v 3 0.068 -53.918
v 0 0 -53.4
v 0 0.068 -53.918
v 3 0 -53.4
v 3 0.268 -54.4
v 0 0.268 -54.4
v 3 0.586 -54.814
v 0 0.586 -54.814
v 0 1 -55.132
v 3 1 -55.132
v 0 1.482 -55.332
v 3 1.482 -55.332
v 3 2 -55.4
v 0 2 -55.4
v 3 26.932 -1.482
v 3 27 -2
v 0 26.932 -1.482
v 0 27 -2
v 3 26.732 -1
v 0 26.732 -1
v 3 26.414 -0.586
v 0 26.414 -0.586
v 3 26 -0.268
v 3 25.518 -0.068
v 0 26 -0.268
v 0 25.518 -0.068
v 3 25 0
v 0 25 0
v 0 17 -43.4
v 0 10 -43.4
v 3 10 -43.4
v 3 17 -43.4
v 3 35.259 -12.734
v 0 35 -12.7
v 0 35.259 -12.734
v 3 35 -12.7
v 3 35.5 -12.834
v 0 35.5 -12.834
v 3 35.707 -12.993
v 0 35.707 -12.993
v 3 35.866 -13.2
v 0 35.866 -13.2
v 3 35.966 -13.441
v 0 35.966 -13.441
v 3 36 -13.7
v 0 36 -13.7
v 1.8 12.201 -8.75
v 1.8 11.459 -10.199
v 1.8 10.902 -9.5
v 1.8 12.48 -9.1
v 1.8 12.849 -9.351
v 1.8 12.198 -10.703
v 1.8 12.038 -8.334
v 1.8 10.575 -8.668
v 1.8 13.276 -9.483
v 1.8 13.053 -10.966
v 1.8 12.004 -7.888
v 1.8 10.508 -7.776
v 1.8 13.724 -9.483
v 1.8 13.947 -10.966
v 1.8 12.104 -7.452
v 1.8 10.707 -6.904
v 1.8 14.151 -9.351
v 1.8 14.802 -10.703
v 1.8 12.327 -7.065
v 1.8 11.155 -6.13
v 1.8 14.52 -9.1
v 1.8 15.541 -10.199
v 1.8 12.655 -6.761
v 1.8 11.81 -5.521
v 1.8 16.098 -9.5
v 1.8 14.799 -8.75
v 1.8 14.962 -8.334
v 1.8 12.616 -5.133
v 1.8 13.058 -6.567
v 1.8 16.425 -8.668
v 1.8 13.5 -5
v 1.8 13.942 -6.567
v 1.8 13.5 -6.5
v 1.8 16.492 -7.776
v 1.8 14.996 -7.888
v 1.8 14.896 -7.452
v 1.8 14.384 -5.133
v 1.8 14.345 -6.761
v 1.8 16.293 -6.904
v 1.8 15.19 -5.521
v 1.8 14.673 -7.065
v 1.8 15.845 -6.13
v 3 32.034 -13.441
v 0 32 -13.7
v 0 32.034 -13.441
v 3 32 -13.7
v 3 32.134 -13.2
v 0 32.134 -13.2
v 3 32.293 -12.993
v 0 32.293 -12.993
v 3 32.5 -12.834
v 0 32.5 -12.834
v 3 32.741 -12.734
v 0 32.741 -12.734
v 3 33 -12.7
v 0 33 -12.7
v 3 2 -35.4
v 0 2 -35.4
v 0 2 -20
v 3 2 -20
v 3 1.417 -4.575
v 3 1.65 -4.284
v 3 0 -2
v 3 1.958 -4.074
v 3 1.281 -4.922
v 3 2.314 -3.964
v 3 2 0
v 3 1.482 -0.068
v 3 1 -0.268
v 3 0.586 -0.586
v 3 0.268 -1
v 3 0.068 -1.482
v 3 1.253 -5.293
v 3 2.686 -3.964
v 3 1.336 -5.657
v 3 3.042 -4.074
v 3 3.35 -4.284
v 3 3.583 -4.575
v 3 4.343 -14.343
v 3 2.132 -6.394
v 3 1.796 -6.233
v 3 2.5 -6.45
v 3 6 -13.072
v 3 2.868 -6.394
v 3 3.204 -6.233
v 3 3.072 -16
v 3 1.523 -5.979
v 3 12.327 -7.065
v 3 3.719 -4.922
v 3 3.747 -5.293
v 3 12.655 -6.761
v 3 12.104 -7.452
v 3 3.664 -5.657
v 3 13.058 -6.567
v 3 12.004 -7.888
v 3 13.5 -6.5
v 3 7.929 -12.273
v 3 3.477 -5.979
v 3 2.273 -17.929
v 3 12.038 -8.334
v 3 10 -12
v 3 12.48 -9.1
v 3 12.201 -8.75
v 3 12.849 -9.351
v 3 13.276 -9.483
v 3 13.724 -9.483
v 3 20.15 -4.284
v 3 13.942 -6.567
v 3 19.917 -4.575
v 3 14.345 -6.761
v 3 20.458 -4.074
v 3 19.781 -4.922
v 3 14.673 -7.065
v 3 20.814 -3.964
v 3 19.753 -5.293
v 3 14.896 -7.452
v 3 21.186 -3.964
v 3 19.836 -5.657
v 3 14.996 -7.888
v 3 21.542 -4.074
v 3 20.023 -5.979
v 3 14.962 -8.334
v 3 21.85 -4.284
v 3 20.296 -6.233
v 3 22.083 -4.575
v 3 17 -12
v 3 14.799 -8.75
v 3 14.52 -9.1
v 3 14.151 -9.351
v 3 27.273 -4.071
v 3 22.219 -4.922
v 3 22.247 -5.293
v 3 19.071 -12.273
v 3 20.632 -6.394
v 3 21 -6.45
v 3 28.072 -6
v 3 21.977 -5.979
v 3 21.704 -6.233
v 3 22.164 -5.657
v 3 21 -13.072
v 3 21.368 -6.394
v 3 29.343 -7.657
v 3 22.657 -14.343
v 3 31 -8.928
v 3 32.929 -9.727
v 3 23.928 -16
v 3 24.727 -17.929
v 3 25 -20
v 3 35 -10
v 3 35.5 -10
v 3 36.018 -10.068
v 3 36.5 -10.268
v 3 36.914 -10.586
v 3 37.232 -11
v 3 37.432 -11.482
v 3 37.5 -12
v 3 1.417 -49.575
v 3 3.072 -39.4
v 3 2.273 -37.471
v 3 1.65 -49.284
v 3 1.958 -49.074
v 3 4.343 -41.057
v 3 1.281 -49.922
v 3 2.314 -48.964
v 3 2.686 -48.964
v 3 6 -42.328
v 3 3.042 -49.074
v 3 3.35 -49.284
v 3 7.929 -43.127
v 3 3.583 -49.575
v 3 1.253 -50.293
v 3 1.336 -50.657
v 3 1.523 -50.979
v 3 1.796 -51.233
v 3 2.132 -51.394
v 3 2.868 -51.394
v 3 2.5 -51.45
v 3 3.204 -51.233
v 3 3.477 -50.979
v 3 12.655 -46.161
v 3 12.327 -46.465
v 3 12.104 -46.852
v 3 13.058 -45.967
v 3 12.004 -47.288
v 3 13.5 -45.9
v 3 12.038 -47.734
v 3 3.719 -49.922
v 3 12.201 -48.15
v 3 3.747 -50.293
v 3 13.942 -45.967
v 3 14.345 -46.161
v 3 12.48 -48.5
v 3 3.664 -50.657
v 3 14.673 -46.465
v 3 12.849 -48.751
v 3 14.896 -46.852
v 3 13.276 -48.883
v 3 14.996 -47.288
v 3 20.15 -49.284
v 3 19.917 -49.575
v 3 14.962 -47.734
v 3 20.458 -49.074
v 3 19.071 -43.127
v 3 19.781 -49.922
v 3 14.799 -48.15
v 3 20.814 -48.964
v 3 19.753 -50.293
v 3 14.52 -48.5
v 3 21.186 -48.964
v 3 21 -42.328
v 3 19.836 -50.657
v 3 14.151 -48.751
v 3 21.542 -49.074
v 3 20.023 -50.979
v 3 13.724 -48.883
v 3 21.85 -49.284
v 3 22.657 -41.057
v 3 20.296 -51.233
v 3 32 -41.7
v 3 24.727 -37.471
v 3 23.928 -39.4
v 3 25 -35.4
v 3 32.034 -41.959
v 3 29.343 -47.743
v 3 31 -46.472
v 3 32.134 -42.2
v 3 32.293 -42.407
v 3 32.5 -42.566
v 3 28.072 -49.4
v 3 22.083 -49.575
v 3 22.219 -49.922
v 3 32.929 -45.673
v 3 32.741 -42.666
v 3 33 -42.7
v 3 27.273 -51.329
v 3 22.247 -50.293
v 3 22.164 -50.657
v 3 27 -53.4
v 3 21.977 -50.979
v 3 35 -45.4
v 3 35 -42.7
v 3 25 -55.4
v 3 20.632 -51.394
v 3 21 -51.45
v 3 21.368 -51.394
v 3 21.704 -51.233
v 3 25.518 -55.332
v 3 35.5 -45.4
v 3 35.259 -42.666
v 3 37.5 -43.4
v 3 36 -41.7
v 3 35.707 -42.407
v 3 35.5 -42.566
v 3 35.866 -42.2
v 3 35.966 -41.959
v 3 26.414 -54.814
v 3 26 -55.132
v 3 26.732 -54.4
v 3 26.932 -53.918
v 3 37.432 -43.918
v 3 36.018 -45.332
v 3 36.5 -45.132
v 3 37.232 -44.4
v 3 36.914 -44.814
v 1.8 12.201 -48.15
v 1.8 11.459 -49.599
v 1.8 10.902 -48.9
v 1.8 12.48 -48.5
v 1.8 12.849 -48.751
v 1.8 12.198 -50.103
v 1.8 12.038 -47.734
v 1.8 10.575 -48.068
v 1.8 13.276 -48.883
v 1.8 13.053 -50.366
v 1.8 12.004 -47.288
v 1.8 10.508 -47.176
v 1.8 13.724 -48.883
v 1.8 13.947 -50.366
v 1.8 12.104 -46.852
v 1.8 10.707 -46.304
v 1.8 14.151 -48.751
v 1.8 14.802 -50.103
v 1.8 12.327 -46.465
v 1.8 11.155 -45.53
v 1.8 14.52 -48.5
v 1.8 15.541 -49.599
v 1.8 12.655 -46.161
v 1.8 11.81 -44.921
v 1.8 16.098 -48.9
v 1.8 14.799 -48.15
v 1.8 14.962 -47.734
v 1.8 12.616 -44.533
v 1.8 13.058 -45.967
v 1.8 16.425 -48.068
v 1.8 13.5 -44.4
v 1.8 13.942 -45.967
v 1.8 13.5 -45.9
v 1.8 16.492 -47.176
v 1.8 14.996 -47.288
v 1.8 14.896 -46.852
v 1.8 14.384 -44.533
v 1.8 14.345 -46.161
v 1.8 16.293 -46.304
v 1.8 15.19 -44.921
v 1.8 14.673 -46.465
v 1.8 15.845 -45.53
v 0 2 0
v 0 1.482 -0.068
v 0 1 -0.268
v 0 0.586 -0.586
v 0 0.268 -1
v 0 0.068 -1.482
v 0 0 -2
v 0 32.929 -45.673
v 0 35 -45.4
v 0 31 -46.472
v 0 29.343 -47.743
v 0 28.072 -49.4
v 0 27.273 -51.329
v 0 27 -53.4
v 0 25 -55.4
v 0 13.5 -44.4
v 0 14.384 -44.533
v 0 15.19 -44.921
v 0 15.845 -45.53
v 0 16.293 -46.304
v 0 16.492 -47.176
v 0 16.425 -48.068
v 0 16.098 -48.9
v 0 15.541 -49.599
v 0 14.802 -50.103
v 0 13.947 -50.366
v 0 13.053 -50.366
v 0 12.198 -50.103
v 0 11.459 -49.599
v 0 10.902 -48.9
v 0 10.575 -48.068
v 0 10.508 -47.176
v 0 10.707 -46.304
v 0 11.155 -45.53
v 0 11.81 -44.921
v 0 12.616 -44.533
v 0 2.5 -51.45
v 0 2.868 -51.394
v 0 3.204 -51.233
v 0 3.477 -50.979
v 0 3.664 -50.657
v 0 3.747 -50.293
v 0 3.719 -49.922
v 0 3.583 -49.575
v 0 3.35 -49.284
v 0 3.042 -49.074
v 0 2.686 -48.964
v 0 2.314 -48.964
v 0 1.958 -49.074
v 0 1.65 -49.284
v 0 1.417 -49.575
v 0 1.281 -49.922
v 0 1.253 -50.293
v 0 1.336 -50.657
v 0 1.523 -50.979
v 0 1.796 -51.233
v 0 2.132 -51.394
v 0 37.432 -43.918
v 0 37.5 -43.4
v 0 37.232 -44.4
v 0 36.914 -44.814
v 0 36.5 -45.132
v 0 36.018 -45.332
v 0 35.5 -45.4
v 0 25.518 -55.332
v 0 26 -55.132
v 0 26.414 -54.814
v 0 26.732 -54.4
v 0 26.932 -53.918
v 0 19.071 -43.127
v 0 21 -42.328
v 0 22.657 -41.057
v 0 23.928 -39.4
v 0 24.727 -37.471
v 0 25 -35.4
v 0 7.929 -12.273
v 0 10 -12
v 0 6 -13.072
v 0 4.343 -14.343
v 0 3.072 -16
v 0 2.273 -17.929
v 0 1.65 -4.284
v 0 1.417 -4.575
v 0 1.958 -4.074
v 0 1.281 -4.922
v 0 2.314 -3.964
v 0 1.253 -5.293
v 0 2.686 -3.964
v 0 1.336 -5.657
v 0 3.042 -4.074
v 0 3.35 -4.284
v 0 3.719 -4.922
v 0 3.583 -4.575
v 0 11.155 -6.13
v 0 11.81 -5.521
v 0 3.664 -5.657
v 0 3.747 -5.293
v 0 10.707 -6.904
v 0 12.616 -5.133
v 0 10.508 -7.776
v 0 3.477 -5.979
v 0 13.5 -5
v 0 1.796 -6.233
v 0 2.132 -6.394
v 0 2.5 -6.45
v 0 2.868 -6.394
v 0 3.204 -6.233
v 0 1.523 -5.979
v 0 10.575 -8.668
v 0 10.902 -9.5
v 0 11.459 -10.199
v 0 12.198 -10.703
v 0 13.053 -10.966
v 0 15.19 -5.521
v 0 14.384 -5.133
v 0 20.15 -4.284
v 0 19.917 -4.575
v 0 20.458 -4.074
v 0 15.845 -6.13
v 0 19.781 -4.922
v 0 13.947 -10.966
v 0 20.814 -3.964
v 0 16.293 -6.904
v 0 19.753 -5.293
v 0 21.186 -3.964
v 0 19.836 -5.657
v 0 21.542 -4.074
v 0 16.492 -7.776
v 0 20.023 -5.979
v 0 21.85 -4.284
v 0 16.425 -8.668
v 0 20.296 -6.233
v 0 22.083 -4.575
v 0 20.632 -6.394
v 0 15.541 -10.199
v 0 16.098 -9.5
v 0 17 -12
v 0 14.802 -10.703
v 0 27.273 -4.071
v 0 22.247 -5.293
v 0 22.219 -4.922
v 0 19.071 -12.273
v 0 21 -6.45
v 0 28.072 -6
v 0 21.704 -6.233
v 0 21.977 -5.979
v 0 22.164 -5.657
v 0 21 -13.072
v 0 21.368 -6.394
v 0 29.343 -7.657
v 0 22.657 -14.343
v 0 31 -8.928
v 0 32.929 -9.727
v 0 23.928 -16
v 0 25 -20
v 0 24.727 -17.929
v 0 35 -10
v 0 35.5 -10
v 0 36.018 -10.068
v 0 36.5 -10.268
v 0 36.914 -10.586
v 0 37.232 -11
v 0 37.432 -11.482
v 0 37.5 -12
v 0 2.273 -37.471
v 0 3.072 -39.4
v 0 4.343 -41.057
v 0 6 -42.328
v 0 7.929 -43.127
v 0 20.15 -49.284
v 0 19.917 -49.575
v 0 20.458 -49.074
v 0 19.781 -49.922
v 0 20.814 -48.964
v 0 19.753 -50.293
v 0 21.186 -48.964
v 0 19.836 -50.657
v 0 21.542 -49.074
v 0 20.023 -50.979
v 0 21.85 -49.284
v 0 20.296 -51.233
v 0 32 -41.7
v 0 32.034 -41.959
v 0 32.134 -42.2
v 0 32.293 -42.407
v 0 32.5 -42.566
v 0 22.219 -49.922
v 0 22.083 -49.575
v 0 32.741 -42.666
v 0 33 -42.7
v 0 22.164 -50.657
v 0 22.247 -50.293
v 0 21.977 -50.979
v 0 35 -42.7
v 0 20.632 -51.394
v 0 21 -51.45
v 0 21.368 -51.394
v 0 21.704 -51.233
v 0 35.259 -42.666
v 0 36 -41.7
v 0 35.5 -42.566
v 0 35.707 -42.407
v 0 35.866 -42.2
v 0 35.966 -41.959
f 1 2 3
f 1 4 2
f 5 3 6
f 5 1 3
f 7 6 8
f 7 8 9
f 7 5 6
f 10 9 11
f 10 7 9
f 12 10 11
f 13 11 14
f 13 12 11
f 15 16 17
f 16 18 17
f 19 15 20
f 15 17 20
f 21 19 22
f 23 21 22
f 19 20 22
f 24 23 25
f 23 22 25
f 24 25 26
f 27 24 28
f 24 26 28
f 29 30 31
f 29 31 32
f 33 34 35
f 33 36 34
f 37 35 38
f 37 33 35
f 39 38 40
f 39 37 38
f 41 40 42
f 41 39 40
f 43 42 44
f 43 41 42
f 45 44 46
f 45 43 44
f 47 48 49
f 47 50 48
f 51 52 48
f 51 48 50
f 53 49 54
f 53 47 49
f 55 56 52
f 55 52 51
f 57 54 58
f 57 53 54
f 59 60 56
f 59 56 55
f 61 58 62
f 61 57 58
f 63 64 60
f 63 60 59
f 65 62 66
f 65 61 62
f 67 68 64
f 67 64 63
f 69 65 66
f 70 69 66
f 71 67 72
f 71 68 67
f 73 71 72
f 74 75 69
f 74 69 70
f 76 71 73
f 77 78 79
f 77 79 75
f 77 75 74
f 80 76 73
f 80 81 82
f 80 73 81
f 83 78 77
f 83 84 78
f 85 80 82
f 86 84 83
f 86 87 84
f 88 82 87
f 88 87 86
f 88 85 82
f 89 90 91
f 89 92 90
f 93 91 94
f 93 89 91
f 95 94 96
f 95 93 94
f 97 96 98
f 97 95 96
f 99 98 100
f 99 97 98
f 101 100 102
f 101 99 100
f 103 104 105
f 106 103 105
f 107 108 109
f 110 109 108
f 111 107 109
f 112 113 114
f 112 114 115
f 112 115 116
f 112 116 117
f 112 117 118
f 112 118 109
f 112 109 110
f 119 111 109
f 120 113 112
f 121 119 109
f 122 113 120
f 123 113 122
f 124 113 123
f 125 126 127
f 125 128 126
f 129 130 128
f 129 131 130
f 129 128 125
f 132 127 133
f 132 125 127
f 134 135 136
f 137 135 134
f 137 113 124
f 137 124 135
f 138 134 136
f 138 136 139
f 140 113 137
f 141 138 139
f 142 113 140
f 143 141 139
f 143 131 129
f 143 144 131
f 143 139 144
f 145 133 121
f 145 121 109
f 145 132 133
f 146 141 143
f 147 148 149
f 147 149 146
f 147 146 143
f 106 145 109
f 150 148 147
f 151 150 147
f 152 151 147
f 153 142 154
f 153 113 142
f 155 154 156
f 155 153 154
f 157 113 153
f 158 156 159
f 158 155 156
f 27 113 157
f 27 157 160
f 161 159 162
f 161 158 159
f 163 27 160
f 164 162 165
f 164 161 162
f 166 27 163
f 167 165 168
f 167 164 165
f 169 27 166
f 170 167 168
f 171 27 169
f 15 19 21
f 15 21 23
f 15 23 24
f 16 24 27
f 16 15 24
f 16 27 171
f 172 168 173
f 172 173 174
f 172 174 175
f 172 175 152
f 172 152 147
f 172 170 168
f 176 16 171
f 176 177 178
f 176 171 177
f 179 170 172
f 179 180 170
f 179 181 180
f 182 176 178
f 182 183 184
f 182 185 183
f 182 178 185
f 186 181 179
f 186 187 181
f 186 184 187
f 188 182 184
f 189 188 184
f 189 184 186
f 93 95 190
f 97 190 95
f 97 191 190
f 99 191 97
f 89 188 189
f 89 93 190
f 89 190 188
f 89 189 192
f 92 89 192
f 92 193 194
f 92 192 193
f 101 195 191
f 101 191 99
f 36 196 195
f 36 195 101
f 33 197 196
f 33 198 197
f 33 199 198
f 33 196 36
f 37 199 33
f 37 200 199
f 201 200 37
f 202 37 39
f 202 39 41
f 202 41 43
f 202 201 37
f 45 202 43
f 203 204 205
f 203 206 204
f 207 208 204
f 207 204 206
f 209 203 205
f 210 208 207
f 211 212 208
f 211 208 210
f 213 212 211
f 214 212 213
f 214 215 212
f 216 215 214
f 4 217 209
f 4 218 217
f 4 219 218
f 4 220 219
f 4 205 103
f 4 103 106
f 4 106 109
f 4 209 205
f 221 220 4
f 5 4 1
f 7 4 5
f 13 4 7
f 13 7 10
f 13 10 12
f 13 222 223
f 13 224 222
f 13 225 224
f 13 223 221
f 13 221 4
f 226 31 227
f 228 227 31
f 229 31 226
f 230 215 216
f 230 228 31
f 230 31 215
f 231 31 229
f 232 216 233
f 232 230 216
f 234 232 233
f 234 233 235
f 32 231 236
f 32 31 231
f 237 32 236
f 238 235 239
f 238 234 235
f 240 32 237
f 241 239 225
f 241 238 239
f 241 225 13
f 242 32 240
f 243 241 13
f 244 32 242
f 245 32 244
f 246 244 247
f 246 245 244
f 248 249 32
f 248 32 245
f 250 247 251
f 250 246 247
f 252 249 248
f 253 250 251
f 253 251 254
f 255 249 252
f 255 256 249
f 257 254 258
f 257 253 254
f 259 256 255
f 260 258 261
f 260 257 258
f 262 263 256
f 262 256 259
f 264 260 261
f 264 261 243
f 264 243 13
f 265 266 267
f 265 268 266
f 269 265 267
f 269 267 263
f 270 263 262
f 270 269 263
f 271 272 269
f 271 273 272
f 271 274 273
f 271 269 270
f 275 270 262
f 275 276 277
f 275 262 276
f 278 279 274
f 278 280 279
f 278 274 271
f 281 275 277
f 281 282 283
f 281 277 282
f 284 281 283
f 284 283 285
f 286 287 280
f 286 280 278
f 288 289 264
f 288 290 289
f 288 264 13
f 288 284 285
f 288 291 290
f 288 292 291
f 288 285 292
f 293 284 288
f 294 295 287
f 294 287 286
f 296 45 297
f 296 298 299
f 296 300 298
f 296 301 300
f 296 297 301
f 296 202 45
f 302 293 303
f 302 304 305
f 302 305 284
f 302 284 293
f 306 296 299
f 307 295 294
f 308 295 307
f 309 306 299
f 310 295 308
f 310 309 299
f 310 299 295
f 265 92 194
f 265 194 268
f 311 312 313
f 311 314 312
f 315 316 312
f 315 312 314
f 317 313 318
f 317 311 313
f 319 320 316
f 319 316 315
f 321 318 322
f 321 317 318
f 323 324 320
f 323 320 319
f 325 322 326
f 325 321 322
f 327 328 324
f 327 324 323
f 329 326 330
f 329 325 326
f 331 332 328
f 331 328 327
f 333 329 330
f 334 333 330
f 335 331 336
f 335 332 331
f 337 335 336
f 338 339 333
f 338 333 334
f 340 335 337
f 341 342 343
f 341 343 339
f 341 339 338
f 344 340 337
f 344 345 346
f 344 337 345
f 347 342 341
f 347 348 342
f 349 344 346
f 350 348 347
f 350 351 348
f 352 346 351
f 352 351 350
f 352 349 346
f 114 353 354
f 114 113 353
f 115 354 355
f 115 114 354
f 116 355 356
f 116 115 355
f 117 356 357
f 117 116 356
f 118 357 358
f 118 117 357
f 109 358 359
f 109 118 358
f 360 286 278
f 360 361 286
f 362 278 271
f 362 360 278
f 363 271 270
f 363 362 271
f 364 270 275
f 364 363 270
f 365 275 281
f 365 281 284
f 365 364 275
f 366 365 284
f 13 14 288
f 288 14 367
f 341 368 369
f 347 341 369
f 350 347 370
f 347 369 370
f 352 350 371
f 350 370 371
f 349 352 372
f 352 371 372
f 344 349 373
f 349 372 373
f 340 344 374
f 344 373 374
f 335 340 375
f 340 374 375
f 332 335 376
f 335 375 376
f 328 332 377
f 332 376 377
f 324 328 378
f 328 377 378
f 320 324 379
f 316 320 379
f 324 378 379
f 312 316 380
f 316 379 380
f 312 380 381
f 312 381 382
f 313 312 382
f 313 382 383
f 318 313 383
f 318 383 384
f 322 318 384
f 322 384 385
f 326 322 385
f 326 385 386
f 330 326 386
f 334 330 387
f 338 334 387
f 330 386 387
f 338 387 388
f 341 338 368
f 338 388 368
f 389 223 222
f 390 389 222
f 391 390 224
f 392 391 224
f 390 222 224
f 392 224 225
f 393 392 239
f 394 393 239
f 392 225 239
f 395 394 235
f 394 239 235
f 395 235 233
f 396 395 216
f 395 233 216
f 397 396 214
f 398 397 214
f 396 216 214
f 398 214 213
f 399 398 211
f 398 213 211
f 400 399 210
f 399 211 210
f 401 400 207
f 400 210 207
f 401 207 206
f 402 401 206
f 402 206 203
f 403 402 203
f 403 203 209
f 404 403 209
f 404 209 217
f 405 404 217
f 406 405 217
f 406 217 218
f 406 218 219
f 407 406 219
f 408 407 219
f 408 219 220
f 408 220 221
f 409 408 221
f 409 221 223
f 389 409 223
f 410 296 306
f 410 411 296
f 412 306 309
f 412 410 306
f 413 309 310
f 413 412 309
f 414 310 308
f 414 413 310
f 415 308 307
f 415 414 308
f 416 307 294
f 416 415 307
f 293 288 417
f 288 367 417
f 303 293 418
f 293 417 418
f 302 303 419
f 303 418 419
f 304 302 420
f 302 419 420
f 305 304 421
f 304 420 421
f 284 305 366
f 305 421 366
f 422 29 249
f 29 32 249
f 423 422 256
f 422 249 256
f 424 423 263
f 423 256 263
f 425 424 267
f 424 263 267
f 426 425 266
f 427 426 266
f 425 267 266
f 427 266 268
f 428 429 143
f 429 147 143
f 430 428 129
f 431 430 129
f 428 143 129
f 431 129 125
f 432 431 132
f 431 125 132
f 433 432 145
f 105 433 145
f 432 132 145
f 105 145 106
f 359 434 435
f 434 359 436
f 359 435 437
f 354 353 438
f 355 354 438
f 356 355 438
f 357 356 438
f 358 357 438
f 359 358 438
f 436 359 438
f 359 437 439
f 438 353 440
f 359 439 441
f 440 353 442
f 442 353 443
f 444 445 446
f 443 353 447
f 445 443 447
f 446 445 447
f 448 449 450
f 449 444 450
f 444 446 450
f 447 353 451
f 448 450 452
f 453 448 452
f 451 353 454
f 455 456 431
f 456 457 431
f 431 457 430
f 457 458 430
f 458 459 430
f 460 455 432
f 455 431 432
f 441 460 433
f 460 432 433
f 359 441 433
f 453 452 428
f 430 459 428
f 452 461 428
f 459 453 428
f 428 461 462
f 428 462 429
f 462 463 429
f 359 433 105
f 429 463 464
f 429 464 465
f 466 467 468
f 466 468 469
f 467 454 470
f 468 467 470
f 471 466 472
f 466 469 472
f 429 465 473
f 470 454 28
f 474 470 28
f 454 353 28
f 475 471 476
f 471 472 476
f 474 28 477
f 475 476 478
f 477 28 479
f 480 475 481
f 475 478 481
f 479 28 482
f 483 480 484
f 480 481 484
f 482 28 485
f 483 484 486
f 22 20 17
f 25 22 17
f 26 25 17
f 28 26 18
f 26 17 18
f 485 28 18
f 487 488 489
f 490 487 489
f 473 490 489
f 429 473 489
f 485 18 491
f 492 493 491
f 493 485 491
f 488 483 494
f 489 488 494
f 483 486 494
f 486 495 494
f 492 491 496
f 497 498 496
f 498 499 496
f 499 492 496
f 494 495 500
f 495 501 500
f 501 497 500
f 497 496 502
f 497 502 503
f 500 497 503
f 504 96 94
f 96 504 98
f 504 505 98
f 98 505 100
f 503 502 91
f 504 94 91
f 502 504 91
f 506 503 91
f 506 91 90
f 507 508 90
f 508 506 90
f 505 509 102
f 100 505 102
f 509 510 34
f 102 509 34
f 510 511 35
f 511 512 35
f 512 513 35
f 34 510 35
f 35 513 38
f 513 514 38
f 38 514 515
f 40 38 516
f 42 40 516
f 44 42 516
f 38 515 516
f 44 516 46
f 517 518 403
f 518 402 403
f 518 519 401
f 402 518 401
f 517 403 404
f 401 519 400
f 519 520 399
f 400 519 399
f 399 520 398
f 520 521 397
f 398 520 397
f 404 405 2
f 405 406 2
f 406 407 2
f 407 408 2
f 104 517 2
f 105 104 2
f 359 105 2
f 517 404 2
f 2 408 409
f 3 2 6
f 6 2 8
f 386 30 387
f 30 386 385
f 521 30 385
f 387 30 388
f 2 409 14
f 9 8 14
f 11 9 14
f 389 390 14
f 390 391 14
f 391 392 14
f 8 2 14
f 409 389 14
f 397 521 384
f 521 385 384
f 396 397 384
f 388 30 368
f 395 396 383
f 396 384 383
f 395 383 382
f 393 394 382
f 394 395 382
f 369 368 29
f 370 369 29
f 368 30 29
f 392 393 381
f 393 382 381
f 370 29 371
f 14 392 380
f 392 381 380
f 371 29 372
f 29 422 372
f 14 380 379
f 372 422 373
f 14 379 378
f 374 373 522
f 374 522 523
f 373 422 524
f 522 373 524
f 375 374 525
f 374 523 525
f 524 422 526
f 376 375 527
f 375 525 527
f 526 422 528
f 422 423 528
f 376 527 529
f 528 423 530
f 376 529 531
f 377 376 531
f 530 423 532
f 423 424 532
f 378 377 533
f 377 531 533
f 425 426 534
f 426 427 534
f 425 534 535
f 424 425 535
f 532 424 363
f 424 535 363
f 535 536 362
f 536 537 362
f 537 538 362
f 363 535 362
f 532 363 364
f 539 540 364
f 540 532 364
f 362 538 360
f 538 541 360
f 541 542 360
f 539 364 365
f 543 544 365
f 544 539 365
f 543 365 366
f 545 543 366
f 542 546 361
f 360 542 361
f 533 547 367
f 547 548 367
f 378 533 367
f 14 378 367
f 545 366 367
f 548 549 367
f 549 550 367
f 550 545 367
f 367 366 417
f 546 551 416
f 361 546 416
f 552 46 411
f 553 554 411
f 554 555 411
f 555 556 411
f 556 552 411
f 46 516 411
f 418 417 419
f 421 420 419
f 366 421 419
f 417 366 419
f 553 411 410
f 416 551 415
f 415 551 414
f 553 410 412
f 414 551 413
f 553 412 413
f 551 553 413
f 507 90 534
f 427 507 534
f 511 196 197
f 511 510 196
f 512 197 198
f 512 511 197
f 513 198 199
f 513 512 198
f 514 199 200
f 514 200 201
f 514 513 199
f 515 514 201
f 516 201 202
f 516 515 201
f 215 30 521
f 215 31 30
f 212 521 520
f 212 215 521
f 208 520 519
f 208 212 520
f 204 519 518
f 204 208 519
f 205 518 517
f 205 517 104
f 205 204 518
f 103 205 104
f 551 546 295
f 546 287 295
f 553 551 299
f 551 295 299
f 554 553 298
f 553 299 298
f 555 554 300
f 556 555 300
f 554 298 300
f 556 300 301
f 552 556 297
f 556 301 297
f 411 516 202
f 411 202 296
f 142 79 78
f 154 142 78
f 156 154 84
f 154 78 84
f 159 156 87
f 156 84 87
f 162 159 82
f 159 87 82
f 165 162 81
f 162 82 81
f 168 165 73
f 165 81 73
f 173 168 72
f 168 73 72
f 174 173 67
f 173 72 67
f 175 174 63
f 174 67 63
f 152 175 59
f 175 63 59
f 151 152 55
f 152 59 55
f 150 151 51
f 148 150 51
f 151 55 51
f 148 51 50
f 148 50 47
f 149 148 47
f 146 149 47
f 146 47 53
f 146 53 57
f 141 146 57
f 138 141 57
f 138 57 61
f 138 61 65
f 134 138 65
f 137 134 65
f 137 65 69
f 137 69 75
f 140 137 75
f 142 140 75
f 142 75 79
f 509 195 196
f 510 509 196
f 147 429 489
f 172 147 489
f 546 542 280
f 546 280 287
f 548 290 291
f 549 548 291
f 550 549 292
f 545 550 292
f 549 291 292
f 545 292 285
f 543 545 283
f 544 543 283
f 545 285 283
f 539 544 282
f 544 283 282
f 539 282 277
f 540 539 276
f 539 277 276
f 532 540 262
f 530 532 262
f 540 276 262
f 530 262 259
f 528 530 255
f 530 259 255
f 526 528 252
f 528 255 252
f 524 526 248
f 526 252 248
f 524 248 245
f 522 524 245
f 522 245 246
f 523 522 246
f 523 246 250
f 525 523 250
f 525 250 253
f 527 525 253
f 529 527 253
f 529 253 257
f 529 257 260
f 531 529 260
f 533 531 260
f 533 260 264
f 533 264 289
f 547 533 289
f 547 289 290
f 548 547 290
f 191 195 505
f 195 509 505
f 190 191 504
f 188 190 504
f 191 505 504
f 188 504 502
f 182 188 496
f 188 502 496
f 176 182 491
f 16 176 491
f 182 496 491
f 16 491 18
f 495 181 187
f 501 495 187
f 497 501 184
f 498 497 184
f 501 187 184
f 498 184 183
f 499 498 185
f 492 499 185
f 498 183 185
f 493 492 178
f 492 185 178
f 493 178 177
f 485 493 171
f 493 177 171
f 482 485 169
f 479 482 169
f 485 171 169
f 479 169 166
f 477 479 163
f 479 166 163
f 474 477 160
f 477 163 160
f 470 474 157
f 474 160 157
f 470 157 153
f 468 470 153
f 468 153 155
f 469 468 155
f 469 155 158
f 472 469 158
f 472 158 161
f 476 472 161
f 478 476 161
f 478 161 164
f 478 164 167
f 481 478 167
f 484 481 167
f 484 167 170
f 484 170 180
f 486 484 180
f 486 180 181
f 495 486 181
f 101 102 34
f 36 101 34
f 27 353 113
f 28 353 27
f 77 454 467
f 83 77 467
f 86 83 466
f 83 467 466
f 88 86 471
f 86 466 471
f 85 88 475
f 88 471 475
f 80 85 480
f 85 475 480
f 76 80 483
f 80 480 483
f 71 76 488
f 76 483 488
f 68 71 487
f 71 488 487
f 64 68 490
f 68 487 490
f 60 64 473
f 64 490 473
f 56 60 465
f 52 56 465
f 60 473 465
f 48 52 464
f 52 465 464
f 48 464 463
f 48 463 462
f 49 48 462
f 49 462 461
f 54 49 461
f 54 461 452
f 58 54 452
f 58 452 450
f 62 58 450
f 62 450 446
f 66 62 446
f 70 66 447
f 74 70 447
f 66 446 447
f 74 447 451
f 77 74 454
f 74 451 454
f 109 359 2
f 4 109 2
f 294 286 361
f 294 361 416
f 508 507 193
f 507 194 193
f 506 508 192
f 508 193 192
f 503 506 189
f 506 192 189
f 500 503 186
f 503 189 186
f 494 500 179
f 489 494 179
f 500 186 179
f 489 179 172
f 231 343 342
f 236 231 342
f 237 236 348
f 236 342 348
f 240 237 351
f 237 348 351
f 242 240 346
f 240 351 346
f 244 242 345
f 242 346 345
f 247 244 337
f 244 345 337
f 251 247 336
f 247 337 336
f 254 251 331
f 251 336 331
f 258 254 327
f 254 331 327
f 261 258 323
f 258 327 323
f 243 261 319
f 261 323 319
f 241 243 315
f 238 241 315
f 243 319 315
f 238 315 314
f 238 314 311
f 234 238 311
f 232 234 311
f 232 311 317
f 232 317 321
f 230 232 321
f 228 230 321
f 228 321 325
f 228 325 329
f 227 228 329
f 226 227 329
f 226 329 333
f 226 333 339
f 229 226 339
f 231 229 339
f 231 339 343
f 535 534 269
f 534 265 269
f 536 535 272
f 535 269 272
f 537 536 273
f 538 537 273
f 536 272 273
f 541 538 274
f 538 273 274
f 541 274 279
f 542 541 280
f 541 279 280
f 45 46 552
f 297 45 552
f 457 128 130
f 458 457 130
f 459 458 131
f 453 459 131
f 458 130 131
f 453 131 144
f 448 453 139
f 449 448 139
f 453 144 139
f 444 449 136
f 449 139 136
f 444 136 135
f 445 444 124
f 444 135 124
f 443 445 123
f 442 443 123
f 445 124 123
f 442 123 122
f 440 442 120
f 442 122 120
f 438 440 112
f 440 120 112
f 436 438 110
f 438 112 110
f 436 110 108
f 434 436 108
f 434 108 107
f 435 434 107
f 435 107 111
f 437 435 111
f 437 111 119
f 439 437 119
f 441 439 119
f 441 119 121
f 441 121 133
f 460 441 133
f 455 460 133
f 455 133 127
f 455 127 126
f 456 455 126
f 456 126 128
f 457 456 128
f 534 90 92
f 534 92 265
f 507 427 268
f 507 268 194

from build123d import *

# Parameters (mm, degrees)
SKETCH_1_W             = 55.4
SKETCH_1_H             = 37.5
SKETCH_1_W_2           = 30
SKETCH_1_H_2           = 4
EXTRUDE_1_DEPTH        = 3
SKETCH_2_R             = 1.25
CUT_EXTRUDE_1_DEPTH    = 67.965737508
SKETCH_3_W             = 10
SKETCH_3_H             = 10.5
CUT_EXTRUDE_2_DEPTH    = 67.965737508
FILLET_2_R             = 1
FILLET_3_R             = 2
SKETCH_6_R             = 1.5
CUT_EXTRUDE_4_DEPTH    = 67.965737508
SKETCH_7_R             = 3
CUT_EXTRUDE_5_DEPTH    = 1.8
FILLET_4_R             = 8
SKETCH_10_W            = 31.4
SKETCH_10_H            = 23
CUT_EXTRUDE_6_DEPTH    = 10
FILLET_5_R             = 8
FILLET_6_R             = 2
HOLE_WIZARD_M3_1_D     = 2.5
HOLE_WIZARD_M3_1_DEPTH = 3
HOLE_WIZARD_M3_1_TIP   = 0.751075774


with BuildPart() as part:
    # 草图1 → 凸台-拉伸1 (new body)
    with BuildSketch(Plane(origin=(0, 0, 0), x_dir=(0, 0, -1), z_dir=(1, 0, 0))):
        with Locations((27.7, 18.75)):
            Rectangle(SKETCH_1_W, SKETCH_1_H)
        with Locations((27.7, 34)):
            Rectangle(SKETCH_1_W_2, SKETCH_1_H_2, mode=Mode.SUBTRACT)
    extrude(amount=EXTRUDE_1_DEPTH)

    # 草图2 → 切除-拉伸1 (cut, through all)
    with BuildSketch(Plane(origin=(3, 0, 0), x_dir=(0, 0, -1), z_dir=(1, 0, 0))):
        with Locations((5.2, 21)):
            Circle(SKETCH_2_R)
        with Locations((5.2, 2.5)):
            Circle(SKETCH_2_R)
        with Locations((50.2, 21)):
            Circle(SKETCH_2_R)
        with Locations((50.2, 2.5)):
            Circle(SKETCH_2_R)
    extrude(amount=-CUT_EXTRUDE_1_DEPTH, mode=Mode.SUBTRACT)

    # 草图3 → 切除-拉伸2 (cut, through all)
    with BuildSketch(Plane(origin=(3, 0, 0), x_dir=(0, 0, -1), z_dir=(1, 0, 0))):
        with Locations((5, 32.25)):
            Rectangle(SKETCH_3_W, SKETCH_3_H)
        with Locations((50.4, 32.25)):
            Rectangle(SKETCH_3_W, SKETCH_3_H)
    extrude(amount=-CUT_EXTRUDE_2_DEPTH, mode=Mode.SUBTRACT)

    # 圆角2
    fillet_2_edges = [part.edges().sort_by_distance(p)[0] for p in [
        (1.5, 36, -12.7),
        (1.5, 32, -12.7),
        (1.5, 32, -42.7),
        (1.5, 36, -42.7),
    ]]
    fillet(fillet_2_edges, radius=FILLET_2_R)

    # 圆角3
    fillet_3_edges = [part.edges().sort_by_distance(p)[0] for p in [
        (1.5, 37.5, -10),
        (1.5, 37.5, -45.4),
    ]]
    fillet(fillet_3_edges, radius=FILLET_3_R)

    # 草图6 → 切除-拉伸4 (cut, through all)
    with BuildSketch(Plane.ZY):
        with Locations((-47.4, 13.5)):
            Circle(SKETCH_6_R)
        with Locations((-8, 13.5)):
            Circle(SKETCH_6_R)
    extrude(amount=-CUT_EXTRUDE_4_DEPTH, mode=Mode.SUBTRACT)

    # 草图7 → 切除-拉伸5 (cut)
    with BuildSketch(Plane.ZY):
        with Locations((-47.4, 13.5)):
            Circle(SKETCH_7_R)
        with Locations((-8, 13.5)):
            Circle(SKETCH_7_R)
    extrude(amount=-CUT_EXTRUDE_5_DEPTH, mode=Mode.SUBTRACT)

    # 圆角4
    fillet_4_edges = [part.edges().sort_by_distance(p)[0] for p in [
        (1.5, 27, -10),
        (1.5, 27, -45.4),
    ]]
    fillet(fillet_4_edges, radius=FILLET_4_R)

    # 草图10 → 切除-拉伸6 (cut)
    with BuildSketch(Plane.ZY):
        with Locations((-27.7, 13.5)):
            Rectangle(SKETCH_10_W, SKETCH_10_H)
    extrude(amount=-CUT_EXTRUDE_6_DEPTH, mode=Mode.SUBTRACT)

    # 圆角5
    fillet_5_edges = [part.edges().sort_by_distance(p)[0] for p in [
        (1.5, 25, -12),
        (1.5, 2, -12),
        (1.5, 2, -43.4),
        (1.5, 25, -43.4),
    ]]
    fillet(fillet_5_edges, radius=FILLET_5_R)

    # 圆角6
    fillet_6_edges = [part.edges().sort_by_distance(p)[0] for p in [
        (1.5, 27, -55.4),
        (1.5, 0, -55.4),
        (1.5, 0, 0),
        (1.5, 27, 0),
    ]]
    fillet(fillet_6_edges, radius=FILLET_6_R - 0.0001)  # a hair under: the kernel refuses the full size

    # M3 螺纹孔1
    with Locations(Plane(origin=(0, 21, -50.2), x_dir=(0, 0, -1), z_dir=(-1, 0, 0))):
        with Locations((0, 0), (0, 18.5), (-45, 18.5), (-45, 0)):
            Hole(HOLE_WIZARD_M3_1_D / 2, depth=HOLE_WIZARD_M3_1_DEPTH)
            with Locations((0, 0, -(HOLE_WIZARD_M3_1_DEPTH + HOLE_WIZARD_M3_1_TIP / 2))):  # 118° drill point
                Cone(0, HOLE_WIZARD_M3_1_D / 2, HOLE_WIZARD_M3_1_TIP, mode=Mode.SUBTRACT)


solid = part.part
